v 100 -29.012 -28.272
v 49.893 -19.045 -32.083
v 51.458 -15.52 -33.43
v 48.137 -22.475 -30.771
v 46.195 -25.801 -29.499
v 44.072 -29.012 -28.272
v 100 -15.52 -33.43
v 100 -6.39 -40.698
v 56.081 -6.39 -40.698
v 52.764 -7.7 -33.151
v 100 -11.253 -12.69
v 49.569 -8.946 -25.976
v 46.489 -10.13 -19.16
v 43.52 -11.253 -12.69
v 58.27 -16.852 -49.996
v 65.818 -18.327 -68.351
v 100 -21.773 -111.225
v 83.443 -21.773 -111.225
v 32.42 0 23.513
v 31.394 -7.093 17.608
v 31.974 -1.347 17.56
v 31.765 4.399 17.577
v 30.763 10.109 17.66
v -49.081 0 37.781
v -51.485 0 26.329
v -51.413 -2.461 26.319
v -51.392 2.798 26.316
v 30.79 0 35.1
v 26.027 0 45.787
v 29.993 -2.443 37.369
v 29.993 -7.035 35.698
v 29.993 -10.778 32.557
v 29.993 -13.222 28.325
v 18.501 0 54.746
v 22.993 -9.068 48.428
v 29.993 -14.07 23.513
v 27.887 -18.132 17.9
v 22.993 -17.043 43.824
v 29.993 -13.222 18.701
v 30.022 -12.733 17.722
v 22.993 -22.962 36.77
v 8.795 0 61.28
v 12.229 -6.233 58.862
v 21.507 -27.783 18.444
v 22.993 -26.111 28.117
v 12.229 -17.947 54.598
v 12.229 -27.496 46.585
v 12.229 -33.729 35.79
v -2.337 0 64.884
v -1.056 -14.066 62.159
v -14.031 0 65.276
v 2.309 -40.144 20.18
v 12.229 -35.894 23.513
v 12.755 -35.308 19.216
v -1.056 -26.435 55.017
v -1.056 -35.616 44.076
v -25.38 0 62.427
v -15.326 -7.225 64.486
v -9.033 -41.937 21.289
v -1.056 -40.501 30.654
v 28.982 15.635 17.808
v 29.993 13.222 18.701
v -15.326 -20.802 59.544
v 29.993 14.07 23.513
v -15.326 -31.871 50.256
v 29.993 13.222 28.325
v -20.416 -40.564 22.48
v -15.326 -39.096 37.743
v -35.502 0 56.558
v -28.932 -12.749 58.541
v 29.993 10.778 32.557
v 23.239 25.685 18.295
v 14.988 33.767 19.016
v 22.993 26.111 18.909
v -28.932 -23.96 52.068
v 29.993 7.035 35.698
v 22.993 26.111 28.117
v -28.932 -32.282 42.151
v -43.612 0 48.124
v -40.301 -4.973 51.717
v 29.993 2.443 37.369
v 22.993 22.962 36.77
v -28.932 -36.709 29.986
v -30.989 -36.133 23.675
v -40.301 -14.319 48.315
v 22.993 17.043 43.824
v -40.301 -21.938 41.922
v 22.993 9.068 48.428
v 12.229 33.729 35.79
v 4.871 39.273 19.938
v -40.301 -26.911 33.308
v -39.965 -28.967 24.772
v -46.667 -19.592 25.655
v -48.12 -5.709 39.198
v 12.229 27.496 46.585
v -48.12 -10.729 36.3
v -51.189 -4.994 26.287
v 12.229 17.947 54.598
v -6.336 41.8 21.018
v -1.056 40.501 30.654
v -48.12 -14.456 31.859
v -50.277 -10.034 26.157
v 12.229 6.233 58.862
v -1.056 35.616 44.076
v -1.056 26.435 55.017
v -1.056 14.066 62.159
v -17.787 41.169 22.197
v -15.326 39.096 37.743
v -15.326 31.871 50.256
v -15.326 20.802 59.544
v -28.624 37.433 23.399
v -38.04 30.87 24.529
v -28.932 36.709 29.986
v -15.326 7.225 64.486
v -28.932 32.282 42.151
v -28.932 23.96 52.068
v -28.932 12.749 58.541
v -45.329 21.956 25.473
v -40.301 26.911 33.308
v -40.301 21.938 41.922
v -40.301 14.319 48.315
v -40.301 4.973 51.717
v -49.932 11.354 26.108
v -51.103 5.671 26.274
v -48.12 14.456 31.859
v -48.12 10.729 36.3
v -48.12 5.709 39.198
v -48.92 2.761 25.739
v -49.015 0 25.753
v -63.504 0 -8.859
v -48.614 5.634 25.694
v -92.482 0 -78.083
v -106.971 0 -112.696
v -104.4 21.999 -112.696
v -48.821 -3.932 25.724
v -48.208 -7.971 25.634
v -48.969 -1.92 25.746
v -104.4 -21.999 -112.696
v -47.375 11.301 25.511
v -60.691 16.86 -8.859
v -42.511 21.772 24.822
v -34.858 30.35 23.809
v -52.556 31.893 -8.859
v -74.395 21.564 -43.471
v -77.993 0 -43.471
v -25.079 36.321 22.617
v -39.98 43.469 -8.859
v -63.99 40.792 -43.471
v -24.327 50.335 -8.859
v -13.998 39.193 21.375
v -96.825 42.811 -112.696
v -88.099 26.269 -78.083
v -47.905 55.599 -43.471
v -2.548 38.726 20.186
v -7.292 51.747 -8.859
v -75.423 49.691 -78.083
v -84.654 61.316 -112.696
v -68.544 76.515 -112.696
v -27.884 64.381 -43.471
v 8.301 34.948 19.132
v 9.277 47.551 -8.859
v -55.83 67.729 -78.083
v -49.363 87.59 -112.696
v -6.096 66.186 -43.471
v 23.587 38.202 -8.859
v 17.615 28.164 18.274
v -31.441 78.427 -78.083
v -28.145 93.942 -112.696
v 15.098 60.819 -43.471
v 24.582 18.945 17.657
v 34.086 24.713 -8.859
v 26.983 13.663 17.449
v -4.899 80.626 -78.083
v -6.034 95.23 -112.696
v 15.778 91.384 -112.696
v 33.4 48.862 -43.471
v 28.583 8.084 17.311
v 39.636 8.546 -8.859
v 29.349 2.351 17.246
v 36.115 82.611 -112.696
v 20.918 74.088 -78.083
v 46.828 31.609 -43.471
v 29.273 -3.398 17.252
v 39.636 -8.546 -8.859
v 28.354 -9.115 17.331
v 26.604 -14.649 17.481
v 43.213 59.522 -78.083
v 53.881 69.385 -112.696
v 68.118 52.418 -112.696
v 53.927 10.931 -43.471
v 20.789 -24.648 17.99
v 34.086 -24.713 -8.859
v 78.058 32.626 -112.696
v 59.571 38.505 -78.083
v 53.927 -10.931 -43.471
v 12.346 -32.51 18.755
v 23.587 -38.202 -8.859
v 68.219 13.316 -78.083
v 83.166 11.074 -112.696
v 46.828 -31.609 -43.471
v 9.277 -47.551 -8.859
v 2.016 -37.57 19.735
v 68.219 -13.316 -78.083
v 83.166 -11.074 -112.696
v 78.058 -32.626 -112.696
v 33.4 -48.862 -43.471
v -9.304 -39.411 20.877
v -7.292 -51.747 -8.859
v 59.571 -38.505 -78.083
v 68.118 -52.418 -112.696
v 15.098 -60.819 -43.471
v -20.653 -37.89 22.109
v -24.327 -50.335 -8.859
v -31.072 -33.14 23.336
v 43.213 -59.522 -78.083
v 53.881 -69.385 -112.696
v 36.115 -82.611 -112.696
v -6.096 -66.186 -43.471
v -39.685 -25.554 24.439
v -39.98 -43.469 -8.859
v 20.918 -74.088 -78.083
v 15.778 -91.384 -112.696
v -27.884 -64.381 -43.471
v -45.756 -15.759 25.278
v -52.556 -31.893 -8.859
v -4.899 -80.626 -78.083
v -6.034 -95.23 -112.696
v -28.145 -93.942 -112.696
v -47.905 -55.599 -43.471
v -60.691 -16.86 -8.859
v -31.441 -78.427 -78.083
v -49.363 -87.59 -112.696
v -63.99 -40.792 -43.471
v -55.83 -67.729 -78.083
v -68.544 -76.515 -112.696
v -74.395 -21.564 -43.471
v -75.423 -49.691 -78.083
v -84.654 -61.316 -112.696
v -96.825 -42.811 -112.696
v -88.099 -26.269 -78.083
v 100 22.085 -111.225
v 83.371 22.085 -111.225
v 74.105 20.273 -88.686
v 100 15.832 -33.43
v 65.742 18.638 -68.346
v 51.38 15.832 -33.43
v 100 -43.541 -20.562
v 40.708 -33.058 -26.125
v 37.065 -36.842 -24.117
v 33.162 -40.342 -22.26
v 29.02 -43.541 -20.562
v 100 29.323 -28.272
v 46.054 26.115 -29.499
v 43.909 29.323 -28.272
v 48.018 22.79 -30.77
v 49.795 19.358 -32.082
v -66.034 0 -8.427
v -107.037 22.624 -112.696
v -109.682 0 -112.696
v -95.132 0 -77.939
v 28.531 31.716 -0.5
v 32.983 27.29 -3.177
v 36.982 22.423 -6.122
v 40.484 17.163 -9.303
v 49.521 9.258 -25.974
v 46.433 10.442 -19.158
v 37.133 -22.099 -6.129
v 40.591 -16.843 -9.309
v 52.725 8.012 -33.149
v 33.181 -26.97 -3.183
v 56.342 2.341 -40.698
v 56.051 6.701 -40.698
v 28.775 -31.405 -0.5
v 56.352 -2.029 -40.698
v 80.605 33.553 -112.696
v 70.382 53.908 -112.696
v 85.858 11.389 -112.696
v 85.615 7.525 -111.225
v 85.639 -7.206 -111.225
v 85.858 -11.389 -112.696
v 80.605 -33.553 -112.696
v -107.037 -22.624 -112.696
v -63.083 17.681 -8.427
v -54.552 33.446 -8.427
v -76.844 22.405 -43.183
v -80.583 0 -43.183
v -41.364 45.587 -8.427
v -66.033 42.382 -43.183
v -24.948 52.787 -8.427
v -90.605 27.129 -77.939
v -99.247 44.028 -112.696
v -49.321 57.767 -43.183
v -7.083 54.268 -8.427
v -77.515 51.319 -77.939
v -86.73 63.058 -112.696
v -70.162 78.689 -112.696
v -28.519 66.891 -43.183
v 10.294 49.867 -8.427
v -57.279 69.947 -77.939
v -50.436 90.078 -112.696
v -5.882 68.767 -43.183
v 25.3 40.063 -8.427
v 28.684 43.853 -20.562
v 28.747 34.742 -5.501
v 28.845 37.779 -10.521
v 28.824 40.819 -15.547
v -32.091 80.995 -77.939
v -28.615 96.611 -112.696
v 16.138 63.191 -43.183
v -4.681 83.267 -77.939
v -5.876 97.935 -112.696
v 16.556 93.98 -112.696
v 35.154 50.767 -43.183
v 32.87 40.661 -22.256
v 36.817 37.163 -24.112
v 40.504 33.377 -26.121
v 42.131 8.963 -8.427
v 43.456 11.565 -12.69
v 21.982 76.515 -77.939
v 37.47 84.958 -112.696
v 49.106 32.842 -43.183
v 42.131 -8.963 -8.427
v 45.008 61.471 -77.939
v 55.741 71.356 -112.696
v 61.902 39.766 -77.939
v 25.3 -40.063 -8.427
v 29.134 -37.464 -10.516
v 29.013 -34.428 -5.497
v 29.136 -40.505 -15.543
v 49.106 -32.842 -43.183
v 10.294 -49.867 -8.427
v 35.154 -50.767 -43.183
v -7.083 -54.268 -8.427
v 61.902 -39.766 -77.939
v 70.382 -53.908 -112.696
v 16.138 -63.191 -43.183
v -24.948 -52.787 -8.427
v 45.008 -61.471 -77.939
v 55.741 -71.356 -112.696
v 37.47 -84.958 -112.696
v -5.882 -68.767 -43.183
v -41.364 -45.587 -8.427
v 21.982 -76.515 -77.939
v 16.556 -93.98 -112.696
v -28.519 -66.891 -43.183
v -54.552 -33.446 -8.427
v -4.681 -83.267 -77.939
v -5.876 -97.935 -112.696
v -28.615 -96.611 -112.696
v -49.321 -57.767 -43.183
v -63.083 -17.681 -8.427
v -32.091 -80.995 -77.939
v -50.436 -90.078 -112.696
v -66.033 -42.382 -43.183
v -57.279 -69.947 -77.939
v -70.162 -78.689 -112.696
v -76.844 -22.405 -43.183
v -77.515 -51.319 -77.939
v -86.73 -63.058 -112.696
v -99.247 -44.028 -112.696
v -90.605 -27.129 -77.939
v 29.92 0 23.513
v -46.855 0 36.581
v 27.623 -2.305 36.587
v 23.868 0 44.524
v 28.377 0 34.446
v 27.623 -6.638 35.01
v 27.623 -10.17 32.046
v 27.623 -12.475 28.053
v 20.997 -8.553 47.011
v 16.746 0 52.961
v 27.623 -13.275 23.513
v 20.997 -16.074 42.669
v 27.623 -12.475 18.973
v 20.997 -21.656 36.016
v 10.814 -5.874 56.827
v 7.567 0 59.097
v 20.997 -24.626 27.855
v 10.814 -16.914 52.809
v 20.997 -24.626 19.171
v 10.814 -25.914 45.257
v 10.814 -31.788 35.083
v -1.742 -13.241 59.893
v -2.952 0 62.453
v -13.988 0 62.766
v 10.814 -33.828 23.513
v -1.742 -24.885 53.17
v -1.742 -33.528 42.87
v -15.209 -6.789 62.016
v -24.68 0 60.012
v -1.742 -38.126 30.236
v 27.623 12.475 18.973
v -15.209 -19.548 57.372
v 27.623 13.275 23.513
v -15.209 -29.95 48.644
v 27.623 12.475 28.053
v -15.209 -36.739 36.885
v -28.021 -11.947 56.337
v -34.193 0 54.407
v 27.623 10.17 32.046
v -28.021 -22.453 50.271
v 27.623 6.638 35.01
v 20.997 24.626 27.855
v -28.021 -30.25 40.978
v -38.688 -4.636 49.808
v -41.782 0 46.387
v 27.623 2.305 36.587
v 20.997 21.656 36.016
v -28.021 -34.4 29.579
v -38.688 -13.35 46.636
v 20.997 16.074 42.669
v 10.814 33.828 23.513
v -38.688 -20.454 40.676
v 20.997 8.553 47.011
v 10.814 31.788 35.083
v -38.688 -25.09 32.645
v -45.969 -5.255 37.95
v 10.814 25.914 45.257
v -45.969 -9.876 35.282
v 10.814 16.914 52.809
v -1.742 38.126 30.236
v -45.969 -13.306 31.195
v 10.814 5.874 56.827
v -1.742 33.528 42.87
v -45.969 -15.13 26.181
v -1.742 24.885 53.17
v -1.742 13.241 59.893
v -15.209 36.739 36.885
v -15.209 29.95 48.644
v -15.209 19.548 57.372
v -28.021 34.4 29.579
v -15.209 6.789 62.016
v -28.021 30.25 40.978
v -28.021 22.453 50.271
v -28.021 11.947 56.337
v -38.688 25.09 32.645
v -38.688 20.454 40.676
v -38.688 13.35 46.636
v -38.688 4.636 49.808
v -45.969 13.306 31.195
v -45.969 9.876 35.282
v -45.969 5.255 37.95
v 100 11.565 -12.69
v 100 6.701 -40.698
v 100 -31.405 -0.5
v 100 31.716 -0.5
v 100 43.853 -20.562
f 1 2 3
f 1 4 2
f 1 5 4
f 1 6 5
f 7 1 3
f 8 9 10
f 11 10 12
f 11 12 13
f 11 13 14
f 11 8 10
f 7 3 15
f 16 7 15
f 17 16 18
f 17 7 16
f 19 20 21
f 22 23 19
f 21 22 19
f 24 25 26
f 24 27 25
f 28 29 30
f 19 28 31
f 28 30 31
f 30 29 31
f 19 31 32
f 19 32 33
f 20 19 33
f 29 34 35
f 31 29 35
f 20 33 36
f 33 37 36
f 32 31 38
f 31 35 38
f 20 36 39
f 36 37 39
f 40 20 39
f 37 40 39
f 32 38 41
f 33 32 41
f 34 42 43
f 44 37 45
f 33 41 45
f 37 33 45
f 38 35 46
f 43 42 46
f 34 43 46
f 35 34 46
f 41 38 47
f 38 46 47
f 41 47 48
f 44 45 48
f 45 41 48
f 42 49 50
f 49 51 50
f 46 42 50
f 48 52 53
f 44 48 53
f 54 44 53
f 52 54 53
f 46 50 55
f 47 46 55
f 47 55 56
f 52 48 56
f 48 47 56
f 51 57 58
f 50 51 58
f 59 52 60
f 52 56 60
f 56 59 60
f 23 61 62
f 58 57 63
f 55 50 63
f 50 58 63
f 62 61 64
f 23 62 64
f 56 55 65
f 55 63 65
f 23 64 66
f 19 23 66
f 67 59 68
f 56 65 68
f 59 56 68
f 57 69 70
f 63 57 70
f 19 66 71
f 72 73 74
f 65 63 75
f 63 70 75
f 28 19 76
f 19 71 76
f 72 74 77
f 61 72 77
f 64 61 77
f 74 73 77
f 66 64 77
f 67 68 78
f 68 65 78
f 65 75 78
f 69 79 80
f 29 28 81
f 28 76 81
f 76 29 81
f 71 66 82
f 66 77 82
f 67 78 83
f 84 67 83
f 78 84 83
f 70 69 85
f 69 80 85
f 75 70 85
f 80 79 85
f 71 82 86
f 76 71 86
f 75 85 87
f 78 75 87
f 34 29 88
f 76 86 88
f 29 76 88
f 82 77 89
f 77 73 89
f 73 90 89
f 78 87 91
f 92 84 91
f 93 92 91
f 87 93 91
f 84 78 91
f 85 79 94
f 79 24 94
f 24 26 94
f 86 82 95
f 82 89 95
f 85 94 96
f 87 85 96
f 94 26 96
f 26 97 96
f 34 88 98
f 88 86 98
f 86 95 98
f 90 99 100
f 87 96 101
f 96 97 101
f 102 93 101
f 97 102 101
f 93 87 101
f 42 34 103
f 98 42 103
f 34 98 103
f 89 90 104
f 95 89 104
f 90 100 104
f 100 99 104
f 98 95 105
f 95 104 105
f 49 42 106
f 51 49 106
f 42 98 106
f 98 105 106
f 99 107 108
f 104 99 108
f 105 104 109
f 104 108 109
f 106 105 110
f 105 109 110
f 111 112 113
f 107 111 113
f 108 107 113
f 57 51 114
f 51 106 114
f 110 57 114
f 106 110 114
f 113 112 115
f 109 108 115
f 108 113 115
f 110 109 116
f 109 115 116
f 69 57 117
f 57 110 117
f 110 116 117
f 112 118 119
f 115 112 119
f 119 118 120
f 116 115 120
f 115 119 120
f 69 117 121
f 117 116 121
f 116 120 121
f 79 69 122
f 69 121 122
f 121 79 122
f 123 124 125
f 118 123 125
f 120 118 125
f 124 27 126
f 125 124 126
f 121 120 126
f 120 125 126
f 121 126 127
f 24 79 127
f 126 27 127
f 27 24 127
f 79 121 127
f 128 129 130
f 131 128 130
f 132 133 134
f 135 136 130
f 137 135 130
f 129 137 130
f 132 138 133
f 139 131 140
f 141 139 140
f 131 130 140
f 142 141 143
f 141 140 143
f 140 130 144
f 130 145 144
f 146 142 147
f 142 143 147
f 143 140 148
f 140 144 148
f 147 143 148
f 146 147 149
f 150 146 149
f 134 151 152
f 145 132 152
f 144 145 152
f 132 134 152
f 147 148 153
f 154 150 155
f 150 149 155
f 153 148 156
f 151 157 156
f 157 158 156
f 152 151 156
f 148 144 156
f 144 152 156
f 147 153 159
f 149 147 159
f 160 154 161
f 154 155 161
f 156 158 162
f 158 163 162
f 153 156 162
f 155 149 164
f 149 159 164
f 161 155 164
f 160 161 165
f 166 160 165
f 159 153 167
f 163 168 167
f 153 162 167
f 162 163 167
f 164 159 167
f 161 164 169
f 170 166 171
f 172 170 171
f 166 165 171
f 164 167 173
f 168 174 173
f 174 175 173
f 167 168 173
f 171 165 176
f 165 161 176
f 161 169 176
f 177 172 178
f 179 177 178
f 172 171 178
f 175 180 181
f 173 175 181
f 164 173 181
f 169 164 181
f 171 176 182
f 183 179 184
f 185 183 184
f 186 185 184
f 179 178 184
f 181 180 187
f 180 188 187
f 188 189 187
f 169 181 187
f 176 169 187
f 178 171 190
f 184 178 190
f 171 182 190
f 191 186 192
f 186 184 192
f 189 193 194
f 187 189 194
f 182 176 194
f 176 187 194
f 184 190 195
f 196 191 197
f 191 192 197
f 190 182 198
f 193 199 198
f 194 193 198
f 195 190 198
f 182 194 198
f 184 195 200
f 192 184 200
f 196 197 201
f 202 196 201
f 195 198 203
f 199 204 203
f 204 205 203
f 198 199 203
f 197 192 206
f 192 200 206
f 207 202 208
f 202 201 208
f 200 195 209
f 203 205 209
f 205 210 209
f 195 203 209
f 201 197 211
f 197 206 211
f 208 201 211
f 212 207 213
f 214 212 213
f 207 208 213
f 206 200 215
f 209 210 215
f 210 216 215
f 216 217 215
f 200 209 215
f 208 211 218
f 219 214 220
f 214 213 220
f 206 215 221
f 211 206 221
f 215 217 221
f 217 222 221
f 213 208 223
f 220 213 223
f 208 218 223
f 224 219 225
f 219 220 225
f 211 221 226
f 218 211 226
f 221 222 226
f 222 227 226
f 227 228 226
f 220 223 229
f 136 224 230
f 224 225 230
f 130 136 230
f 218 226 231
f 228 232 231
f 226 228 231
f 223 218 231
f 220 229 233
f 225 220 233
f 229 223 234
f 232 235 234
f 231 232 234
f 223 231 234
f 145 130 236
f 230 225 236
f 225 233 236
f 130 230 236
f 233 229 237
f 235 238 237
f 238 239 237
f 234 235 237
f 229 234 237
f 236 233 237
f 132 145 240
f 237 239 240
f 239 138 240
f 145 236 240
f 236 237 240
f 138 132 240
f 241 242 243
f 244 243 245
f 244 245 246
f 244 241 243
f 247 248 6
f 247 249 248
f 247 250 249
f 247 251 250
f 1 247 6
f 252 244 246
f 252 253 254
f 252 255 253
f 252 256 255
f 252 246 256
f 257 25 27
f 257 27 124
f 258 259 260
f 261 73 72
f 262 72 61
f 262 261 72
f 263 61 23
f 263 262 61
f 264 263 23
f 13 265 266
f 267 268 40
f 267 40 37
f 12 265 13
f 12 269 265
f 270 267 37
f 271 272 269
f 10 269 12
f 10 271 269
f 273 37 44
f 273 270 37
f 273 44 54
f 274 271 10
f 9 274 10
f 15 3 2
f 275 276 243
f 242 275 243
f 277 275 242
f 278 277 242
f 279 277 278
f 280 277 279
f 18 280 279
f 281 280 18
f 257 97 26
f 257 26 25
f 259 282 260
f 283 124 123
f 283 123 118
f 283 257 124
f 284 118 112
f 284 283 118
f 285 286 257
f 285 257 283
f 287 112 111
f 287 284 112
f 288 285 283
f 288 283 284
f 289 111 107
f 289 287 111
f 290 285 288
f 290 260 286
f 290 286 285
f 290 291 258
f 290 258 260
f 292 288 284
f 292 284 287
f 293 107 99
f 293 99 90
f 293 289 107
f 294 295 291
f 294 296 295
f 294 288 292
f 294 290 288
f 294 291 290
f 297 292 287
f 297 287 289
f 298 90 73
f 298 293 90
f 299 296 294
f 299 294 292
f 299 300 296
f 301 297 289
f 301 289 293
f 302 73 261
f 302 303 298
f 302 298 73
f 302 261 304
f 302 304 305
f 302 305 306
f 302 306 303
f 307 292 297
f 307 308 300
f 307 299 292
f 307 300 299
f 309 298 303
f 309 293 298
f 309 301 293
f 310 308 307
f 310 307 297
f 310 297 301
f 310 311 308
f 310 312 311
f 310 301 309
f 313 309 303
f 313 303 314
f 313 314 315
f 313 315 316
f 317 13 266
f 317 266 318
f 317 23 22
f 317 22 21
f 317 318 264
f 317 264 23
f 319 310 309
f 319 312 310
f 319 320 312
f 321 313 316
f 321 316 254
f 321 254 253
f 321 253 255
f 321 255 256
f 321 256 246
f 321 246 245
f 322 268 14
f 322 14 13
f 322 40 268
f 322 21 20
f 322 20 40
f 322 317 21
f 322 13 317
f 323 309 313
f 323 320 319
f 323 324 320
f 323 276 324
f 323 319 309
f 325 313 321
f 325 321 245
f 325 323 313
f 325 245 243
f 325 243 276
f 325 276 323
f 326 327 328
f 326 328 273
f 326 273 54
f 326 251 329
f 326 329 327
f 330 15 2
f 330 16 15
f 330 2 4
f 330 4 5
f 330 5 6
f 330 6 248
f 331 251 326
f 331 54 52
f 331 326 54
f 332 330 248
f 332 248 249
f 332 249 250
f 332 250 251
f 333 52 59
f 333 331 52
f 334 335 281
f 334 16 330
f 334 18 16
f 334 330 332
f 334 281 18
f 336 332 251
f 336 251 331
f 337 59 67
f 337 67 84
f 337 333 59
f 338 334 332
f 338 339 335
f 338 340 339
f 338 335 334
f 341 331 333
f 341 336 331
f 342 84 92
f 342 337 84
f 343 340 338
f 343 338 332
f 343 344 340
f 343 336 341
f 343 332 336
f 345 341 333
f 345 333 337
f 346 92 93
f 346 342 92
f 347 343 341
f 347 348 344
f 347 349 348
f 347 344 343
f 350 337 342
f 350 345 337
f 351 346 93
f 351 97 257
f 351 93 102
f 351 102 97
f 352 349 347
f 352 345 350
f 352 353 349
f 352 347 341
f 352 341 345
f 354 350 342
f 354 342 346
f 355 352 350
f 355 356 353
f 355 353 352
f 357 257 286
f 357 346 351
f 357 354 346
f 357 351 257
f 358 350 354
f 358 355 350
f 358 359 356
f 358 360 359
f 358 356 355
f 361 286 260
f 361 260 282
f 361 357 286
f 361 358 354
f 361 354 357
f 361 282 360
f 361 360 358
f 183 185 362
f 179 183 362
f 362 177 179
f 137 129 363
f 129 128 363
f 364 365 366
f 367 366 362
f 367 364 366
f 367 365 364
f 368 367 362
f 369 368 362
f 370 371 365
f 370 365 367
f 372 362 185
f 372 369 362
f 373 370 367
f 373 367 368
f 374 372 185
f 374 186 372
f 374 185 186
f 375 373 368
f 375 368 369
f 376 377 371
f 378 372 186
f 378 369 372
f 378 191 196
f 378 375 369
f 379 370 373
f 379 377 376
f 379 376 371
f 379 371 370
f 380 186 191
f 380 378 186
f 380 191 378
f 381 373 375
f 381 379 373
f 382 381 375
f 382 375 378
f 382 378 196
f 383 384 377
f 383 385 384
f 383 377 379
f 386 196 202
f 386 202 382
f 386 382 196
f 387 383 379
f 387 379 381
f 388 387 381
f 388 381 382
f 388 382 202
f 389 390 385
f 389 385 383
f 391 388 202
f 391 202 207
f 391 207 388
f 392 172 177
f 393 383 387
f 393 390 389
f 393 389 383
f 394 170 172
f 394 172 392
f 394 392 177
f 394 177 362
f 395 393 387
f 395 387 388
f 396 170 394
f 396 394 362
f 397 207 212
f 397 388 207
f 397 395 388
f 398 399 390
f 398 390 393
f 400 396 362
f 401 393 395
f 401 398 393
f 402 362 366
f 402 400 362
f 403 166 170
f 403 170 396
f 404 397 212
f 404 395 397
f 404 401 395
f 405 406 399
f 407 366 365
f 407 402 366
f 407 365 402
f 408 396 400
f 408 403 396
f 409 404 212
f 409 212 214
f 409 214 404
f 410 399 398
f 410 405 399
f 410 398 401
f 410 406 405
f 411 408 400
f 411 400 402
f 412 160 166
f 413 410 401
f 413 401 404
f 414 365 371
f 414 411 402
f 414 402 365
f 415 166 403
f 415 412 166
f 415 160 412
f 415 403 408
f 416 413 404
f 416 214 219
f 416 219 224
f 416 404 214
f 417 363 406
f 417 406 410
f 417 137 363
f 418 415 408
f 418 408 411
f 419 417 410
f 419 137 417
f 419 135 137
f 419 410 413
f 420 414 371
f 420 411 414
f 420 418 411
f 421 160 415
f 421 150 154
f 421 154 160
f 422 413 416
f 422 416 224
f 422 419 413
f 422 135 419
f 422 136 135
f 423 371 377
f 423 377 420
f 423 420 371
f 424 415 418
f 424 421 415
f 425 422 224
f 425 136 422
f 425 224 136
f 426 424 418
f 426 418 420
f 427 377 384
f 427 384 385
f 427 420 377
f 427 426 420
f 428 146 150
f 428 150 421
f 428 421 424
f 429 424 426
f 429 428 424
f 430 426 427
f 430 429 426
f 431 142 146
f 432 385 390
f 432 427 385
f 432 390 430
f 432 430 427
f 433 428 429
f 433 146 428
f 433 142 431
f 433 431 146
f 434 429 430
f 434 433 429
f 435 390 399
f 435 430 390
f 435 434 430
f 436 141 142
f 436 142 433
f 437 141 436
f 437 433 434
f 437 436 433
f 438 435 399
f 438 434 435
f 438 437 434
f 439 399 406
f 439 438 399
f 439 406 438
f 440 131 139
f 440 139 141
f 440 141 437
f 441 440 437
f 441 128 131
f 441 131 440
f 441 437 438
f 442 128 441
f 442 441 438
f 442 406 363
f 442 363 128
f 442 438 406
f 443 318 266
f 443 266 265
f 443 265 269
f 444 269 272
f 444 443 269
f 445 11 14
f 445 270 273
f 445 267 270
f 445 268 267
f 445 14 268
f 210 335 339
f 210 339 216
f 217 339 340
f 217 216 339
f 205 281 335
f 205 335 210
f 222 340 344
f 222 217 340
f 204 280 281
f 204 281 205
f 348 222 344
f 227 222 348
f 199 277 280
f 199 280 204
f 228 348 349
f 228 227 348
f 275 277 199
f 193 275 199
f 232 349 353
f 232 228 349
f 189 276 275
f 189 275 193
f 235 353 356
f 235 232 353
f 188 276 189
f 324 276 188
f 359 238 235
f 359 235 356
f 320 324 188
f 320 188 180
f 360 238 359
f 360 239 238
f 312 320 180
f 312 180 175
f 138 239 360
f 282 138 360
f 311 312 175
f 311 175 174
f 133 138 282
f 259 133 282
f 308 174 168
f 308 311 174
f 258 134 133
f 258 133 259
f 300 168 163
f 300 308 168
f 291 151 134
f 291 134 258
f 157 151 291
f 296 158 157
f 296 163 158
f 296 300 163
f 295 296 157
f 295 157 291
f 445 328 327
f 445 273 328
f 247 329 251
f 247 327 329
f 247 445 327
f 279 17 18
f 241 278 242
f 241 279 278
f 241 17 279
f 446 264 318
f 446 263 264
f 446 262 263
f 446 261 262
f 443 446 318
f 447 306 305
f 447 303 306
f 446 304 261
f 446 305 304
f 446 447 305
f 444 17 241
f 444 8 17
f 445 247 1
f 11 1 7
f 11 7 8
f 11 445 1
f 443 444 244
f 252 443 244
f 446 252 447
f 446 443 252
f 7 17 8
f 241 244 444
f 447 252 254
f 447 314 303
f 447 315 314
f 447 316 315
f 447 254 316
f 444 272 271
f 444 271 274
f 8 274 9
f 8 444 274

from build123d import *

# Parameters (mm, degrees)
F4_T = -2.5


with BuildPart() as f1:
    # F0 (on Front) → F1 (revolve)
    with BuildSketch(Plane.XZ):
        with BuildLine():
            ThreePointArc((32.4202927587, 23.5130339861), (-9.5793837681, 65.5127105129), (-51.579060295, 23.5130339861))
            Line((-51.579060295, 23.5130339861), (32.4202927587, 23.5130339861))
        make_face()
    revolve(axis=Axis((1.7417054623, 0, 23.5130339861), (1, 0, 0)))

    # F2 (on Front) → F3 (revolve)
    with BuildSketch(Plane.XZ):
        Polygon((-11.5802306682, -112.6956120133), (-11.5802306682, 26.4526642859), (-51.4328964055, 26.4526642859), (-109.681583941, -112.6956120133), align=None)
    revolve(axis=Axis((-11.5802306682, 0, -22.7773860097), (0, 0, -1)))

    # F4
    f4_openings = [f1.faces().sort_by_distance(p)[0] for p in [
        (-11.580231, 0, -112.695612),
    ]]
    offset(amount=F4_T, openings=f4_openings, kind=Kind.INTERSECTION)

    # F6 (on offset) → F7 (join, up to the next surface of F1)
    with BuildSketch(Plane.YZ.offset(100)):
        Polygon((43.8527846002, -20.5623030921), (31.7161967759, -0.4996404972), (11.5647516543, -12.6899358952), (6.7012720683, -40.6980113115), (0.1556711213, -40.6980113115), (-6.3899298257, -40.6980113115), (-11.2534094117, -12.6899358952), (-31.4048545333, -0.4996404972), (-43.5414423575, -20.5623030921), (-29.0120014979, -28.2718026068), (-15.5202871088, -33.4303977157), (-21.773227875, -111.2250647365), (22.0845701176, -111.2250647365), (15.8316293515, -33.4303977157), (29.3233437405, -28.2718026068), align=None)
    extrude(until=Until.NEXT, dir=(-1, 0, 0))


solid = f1.part
